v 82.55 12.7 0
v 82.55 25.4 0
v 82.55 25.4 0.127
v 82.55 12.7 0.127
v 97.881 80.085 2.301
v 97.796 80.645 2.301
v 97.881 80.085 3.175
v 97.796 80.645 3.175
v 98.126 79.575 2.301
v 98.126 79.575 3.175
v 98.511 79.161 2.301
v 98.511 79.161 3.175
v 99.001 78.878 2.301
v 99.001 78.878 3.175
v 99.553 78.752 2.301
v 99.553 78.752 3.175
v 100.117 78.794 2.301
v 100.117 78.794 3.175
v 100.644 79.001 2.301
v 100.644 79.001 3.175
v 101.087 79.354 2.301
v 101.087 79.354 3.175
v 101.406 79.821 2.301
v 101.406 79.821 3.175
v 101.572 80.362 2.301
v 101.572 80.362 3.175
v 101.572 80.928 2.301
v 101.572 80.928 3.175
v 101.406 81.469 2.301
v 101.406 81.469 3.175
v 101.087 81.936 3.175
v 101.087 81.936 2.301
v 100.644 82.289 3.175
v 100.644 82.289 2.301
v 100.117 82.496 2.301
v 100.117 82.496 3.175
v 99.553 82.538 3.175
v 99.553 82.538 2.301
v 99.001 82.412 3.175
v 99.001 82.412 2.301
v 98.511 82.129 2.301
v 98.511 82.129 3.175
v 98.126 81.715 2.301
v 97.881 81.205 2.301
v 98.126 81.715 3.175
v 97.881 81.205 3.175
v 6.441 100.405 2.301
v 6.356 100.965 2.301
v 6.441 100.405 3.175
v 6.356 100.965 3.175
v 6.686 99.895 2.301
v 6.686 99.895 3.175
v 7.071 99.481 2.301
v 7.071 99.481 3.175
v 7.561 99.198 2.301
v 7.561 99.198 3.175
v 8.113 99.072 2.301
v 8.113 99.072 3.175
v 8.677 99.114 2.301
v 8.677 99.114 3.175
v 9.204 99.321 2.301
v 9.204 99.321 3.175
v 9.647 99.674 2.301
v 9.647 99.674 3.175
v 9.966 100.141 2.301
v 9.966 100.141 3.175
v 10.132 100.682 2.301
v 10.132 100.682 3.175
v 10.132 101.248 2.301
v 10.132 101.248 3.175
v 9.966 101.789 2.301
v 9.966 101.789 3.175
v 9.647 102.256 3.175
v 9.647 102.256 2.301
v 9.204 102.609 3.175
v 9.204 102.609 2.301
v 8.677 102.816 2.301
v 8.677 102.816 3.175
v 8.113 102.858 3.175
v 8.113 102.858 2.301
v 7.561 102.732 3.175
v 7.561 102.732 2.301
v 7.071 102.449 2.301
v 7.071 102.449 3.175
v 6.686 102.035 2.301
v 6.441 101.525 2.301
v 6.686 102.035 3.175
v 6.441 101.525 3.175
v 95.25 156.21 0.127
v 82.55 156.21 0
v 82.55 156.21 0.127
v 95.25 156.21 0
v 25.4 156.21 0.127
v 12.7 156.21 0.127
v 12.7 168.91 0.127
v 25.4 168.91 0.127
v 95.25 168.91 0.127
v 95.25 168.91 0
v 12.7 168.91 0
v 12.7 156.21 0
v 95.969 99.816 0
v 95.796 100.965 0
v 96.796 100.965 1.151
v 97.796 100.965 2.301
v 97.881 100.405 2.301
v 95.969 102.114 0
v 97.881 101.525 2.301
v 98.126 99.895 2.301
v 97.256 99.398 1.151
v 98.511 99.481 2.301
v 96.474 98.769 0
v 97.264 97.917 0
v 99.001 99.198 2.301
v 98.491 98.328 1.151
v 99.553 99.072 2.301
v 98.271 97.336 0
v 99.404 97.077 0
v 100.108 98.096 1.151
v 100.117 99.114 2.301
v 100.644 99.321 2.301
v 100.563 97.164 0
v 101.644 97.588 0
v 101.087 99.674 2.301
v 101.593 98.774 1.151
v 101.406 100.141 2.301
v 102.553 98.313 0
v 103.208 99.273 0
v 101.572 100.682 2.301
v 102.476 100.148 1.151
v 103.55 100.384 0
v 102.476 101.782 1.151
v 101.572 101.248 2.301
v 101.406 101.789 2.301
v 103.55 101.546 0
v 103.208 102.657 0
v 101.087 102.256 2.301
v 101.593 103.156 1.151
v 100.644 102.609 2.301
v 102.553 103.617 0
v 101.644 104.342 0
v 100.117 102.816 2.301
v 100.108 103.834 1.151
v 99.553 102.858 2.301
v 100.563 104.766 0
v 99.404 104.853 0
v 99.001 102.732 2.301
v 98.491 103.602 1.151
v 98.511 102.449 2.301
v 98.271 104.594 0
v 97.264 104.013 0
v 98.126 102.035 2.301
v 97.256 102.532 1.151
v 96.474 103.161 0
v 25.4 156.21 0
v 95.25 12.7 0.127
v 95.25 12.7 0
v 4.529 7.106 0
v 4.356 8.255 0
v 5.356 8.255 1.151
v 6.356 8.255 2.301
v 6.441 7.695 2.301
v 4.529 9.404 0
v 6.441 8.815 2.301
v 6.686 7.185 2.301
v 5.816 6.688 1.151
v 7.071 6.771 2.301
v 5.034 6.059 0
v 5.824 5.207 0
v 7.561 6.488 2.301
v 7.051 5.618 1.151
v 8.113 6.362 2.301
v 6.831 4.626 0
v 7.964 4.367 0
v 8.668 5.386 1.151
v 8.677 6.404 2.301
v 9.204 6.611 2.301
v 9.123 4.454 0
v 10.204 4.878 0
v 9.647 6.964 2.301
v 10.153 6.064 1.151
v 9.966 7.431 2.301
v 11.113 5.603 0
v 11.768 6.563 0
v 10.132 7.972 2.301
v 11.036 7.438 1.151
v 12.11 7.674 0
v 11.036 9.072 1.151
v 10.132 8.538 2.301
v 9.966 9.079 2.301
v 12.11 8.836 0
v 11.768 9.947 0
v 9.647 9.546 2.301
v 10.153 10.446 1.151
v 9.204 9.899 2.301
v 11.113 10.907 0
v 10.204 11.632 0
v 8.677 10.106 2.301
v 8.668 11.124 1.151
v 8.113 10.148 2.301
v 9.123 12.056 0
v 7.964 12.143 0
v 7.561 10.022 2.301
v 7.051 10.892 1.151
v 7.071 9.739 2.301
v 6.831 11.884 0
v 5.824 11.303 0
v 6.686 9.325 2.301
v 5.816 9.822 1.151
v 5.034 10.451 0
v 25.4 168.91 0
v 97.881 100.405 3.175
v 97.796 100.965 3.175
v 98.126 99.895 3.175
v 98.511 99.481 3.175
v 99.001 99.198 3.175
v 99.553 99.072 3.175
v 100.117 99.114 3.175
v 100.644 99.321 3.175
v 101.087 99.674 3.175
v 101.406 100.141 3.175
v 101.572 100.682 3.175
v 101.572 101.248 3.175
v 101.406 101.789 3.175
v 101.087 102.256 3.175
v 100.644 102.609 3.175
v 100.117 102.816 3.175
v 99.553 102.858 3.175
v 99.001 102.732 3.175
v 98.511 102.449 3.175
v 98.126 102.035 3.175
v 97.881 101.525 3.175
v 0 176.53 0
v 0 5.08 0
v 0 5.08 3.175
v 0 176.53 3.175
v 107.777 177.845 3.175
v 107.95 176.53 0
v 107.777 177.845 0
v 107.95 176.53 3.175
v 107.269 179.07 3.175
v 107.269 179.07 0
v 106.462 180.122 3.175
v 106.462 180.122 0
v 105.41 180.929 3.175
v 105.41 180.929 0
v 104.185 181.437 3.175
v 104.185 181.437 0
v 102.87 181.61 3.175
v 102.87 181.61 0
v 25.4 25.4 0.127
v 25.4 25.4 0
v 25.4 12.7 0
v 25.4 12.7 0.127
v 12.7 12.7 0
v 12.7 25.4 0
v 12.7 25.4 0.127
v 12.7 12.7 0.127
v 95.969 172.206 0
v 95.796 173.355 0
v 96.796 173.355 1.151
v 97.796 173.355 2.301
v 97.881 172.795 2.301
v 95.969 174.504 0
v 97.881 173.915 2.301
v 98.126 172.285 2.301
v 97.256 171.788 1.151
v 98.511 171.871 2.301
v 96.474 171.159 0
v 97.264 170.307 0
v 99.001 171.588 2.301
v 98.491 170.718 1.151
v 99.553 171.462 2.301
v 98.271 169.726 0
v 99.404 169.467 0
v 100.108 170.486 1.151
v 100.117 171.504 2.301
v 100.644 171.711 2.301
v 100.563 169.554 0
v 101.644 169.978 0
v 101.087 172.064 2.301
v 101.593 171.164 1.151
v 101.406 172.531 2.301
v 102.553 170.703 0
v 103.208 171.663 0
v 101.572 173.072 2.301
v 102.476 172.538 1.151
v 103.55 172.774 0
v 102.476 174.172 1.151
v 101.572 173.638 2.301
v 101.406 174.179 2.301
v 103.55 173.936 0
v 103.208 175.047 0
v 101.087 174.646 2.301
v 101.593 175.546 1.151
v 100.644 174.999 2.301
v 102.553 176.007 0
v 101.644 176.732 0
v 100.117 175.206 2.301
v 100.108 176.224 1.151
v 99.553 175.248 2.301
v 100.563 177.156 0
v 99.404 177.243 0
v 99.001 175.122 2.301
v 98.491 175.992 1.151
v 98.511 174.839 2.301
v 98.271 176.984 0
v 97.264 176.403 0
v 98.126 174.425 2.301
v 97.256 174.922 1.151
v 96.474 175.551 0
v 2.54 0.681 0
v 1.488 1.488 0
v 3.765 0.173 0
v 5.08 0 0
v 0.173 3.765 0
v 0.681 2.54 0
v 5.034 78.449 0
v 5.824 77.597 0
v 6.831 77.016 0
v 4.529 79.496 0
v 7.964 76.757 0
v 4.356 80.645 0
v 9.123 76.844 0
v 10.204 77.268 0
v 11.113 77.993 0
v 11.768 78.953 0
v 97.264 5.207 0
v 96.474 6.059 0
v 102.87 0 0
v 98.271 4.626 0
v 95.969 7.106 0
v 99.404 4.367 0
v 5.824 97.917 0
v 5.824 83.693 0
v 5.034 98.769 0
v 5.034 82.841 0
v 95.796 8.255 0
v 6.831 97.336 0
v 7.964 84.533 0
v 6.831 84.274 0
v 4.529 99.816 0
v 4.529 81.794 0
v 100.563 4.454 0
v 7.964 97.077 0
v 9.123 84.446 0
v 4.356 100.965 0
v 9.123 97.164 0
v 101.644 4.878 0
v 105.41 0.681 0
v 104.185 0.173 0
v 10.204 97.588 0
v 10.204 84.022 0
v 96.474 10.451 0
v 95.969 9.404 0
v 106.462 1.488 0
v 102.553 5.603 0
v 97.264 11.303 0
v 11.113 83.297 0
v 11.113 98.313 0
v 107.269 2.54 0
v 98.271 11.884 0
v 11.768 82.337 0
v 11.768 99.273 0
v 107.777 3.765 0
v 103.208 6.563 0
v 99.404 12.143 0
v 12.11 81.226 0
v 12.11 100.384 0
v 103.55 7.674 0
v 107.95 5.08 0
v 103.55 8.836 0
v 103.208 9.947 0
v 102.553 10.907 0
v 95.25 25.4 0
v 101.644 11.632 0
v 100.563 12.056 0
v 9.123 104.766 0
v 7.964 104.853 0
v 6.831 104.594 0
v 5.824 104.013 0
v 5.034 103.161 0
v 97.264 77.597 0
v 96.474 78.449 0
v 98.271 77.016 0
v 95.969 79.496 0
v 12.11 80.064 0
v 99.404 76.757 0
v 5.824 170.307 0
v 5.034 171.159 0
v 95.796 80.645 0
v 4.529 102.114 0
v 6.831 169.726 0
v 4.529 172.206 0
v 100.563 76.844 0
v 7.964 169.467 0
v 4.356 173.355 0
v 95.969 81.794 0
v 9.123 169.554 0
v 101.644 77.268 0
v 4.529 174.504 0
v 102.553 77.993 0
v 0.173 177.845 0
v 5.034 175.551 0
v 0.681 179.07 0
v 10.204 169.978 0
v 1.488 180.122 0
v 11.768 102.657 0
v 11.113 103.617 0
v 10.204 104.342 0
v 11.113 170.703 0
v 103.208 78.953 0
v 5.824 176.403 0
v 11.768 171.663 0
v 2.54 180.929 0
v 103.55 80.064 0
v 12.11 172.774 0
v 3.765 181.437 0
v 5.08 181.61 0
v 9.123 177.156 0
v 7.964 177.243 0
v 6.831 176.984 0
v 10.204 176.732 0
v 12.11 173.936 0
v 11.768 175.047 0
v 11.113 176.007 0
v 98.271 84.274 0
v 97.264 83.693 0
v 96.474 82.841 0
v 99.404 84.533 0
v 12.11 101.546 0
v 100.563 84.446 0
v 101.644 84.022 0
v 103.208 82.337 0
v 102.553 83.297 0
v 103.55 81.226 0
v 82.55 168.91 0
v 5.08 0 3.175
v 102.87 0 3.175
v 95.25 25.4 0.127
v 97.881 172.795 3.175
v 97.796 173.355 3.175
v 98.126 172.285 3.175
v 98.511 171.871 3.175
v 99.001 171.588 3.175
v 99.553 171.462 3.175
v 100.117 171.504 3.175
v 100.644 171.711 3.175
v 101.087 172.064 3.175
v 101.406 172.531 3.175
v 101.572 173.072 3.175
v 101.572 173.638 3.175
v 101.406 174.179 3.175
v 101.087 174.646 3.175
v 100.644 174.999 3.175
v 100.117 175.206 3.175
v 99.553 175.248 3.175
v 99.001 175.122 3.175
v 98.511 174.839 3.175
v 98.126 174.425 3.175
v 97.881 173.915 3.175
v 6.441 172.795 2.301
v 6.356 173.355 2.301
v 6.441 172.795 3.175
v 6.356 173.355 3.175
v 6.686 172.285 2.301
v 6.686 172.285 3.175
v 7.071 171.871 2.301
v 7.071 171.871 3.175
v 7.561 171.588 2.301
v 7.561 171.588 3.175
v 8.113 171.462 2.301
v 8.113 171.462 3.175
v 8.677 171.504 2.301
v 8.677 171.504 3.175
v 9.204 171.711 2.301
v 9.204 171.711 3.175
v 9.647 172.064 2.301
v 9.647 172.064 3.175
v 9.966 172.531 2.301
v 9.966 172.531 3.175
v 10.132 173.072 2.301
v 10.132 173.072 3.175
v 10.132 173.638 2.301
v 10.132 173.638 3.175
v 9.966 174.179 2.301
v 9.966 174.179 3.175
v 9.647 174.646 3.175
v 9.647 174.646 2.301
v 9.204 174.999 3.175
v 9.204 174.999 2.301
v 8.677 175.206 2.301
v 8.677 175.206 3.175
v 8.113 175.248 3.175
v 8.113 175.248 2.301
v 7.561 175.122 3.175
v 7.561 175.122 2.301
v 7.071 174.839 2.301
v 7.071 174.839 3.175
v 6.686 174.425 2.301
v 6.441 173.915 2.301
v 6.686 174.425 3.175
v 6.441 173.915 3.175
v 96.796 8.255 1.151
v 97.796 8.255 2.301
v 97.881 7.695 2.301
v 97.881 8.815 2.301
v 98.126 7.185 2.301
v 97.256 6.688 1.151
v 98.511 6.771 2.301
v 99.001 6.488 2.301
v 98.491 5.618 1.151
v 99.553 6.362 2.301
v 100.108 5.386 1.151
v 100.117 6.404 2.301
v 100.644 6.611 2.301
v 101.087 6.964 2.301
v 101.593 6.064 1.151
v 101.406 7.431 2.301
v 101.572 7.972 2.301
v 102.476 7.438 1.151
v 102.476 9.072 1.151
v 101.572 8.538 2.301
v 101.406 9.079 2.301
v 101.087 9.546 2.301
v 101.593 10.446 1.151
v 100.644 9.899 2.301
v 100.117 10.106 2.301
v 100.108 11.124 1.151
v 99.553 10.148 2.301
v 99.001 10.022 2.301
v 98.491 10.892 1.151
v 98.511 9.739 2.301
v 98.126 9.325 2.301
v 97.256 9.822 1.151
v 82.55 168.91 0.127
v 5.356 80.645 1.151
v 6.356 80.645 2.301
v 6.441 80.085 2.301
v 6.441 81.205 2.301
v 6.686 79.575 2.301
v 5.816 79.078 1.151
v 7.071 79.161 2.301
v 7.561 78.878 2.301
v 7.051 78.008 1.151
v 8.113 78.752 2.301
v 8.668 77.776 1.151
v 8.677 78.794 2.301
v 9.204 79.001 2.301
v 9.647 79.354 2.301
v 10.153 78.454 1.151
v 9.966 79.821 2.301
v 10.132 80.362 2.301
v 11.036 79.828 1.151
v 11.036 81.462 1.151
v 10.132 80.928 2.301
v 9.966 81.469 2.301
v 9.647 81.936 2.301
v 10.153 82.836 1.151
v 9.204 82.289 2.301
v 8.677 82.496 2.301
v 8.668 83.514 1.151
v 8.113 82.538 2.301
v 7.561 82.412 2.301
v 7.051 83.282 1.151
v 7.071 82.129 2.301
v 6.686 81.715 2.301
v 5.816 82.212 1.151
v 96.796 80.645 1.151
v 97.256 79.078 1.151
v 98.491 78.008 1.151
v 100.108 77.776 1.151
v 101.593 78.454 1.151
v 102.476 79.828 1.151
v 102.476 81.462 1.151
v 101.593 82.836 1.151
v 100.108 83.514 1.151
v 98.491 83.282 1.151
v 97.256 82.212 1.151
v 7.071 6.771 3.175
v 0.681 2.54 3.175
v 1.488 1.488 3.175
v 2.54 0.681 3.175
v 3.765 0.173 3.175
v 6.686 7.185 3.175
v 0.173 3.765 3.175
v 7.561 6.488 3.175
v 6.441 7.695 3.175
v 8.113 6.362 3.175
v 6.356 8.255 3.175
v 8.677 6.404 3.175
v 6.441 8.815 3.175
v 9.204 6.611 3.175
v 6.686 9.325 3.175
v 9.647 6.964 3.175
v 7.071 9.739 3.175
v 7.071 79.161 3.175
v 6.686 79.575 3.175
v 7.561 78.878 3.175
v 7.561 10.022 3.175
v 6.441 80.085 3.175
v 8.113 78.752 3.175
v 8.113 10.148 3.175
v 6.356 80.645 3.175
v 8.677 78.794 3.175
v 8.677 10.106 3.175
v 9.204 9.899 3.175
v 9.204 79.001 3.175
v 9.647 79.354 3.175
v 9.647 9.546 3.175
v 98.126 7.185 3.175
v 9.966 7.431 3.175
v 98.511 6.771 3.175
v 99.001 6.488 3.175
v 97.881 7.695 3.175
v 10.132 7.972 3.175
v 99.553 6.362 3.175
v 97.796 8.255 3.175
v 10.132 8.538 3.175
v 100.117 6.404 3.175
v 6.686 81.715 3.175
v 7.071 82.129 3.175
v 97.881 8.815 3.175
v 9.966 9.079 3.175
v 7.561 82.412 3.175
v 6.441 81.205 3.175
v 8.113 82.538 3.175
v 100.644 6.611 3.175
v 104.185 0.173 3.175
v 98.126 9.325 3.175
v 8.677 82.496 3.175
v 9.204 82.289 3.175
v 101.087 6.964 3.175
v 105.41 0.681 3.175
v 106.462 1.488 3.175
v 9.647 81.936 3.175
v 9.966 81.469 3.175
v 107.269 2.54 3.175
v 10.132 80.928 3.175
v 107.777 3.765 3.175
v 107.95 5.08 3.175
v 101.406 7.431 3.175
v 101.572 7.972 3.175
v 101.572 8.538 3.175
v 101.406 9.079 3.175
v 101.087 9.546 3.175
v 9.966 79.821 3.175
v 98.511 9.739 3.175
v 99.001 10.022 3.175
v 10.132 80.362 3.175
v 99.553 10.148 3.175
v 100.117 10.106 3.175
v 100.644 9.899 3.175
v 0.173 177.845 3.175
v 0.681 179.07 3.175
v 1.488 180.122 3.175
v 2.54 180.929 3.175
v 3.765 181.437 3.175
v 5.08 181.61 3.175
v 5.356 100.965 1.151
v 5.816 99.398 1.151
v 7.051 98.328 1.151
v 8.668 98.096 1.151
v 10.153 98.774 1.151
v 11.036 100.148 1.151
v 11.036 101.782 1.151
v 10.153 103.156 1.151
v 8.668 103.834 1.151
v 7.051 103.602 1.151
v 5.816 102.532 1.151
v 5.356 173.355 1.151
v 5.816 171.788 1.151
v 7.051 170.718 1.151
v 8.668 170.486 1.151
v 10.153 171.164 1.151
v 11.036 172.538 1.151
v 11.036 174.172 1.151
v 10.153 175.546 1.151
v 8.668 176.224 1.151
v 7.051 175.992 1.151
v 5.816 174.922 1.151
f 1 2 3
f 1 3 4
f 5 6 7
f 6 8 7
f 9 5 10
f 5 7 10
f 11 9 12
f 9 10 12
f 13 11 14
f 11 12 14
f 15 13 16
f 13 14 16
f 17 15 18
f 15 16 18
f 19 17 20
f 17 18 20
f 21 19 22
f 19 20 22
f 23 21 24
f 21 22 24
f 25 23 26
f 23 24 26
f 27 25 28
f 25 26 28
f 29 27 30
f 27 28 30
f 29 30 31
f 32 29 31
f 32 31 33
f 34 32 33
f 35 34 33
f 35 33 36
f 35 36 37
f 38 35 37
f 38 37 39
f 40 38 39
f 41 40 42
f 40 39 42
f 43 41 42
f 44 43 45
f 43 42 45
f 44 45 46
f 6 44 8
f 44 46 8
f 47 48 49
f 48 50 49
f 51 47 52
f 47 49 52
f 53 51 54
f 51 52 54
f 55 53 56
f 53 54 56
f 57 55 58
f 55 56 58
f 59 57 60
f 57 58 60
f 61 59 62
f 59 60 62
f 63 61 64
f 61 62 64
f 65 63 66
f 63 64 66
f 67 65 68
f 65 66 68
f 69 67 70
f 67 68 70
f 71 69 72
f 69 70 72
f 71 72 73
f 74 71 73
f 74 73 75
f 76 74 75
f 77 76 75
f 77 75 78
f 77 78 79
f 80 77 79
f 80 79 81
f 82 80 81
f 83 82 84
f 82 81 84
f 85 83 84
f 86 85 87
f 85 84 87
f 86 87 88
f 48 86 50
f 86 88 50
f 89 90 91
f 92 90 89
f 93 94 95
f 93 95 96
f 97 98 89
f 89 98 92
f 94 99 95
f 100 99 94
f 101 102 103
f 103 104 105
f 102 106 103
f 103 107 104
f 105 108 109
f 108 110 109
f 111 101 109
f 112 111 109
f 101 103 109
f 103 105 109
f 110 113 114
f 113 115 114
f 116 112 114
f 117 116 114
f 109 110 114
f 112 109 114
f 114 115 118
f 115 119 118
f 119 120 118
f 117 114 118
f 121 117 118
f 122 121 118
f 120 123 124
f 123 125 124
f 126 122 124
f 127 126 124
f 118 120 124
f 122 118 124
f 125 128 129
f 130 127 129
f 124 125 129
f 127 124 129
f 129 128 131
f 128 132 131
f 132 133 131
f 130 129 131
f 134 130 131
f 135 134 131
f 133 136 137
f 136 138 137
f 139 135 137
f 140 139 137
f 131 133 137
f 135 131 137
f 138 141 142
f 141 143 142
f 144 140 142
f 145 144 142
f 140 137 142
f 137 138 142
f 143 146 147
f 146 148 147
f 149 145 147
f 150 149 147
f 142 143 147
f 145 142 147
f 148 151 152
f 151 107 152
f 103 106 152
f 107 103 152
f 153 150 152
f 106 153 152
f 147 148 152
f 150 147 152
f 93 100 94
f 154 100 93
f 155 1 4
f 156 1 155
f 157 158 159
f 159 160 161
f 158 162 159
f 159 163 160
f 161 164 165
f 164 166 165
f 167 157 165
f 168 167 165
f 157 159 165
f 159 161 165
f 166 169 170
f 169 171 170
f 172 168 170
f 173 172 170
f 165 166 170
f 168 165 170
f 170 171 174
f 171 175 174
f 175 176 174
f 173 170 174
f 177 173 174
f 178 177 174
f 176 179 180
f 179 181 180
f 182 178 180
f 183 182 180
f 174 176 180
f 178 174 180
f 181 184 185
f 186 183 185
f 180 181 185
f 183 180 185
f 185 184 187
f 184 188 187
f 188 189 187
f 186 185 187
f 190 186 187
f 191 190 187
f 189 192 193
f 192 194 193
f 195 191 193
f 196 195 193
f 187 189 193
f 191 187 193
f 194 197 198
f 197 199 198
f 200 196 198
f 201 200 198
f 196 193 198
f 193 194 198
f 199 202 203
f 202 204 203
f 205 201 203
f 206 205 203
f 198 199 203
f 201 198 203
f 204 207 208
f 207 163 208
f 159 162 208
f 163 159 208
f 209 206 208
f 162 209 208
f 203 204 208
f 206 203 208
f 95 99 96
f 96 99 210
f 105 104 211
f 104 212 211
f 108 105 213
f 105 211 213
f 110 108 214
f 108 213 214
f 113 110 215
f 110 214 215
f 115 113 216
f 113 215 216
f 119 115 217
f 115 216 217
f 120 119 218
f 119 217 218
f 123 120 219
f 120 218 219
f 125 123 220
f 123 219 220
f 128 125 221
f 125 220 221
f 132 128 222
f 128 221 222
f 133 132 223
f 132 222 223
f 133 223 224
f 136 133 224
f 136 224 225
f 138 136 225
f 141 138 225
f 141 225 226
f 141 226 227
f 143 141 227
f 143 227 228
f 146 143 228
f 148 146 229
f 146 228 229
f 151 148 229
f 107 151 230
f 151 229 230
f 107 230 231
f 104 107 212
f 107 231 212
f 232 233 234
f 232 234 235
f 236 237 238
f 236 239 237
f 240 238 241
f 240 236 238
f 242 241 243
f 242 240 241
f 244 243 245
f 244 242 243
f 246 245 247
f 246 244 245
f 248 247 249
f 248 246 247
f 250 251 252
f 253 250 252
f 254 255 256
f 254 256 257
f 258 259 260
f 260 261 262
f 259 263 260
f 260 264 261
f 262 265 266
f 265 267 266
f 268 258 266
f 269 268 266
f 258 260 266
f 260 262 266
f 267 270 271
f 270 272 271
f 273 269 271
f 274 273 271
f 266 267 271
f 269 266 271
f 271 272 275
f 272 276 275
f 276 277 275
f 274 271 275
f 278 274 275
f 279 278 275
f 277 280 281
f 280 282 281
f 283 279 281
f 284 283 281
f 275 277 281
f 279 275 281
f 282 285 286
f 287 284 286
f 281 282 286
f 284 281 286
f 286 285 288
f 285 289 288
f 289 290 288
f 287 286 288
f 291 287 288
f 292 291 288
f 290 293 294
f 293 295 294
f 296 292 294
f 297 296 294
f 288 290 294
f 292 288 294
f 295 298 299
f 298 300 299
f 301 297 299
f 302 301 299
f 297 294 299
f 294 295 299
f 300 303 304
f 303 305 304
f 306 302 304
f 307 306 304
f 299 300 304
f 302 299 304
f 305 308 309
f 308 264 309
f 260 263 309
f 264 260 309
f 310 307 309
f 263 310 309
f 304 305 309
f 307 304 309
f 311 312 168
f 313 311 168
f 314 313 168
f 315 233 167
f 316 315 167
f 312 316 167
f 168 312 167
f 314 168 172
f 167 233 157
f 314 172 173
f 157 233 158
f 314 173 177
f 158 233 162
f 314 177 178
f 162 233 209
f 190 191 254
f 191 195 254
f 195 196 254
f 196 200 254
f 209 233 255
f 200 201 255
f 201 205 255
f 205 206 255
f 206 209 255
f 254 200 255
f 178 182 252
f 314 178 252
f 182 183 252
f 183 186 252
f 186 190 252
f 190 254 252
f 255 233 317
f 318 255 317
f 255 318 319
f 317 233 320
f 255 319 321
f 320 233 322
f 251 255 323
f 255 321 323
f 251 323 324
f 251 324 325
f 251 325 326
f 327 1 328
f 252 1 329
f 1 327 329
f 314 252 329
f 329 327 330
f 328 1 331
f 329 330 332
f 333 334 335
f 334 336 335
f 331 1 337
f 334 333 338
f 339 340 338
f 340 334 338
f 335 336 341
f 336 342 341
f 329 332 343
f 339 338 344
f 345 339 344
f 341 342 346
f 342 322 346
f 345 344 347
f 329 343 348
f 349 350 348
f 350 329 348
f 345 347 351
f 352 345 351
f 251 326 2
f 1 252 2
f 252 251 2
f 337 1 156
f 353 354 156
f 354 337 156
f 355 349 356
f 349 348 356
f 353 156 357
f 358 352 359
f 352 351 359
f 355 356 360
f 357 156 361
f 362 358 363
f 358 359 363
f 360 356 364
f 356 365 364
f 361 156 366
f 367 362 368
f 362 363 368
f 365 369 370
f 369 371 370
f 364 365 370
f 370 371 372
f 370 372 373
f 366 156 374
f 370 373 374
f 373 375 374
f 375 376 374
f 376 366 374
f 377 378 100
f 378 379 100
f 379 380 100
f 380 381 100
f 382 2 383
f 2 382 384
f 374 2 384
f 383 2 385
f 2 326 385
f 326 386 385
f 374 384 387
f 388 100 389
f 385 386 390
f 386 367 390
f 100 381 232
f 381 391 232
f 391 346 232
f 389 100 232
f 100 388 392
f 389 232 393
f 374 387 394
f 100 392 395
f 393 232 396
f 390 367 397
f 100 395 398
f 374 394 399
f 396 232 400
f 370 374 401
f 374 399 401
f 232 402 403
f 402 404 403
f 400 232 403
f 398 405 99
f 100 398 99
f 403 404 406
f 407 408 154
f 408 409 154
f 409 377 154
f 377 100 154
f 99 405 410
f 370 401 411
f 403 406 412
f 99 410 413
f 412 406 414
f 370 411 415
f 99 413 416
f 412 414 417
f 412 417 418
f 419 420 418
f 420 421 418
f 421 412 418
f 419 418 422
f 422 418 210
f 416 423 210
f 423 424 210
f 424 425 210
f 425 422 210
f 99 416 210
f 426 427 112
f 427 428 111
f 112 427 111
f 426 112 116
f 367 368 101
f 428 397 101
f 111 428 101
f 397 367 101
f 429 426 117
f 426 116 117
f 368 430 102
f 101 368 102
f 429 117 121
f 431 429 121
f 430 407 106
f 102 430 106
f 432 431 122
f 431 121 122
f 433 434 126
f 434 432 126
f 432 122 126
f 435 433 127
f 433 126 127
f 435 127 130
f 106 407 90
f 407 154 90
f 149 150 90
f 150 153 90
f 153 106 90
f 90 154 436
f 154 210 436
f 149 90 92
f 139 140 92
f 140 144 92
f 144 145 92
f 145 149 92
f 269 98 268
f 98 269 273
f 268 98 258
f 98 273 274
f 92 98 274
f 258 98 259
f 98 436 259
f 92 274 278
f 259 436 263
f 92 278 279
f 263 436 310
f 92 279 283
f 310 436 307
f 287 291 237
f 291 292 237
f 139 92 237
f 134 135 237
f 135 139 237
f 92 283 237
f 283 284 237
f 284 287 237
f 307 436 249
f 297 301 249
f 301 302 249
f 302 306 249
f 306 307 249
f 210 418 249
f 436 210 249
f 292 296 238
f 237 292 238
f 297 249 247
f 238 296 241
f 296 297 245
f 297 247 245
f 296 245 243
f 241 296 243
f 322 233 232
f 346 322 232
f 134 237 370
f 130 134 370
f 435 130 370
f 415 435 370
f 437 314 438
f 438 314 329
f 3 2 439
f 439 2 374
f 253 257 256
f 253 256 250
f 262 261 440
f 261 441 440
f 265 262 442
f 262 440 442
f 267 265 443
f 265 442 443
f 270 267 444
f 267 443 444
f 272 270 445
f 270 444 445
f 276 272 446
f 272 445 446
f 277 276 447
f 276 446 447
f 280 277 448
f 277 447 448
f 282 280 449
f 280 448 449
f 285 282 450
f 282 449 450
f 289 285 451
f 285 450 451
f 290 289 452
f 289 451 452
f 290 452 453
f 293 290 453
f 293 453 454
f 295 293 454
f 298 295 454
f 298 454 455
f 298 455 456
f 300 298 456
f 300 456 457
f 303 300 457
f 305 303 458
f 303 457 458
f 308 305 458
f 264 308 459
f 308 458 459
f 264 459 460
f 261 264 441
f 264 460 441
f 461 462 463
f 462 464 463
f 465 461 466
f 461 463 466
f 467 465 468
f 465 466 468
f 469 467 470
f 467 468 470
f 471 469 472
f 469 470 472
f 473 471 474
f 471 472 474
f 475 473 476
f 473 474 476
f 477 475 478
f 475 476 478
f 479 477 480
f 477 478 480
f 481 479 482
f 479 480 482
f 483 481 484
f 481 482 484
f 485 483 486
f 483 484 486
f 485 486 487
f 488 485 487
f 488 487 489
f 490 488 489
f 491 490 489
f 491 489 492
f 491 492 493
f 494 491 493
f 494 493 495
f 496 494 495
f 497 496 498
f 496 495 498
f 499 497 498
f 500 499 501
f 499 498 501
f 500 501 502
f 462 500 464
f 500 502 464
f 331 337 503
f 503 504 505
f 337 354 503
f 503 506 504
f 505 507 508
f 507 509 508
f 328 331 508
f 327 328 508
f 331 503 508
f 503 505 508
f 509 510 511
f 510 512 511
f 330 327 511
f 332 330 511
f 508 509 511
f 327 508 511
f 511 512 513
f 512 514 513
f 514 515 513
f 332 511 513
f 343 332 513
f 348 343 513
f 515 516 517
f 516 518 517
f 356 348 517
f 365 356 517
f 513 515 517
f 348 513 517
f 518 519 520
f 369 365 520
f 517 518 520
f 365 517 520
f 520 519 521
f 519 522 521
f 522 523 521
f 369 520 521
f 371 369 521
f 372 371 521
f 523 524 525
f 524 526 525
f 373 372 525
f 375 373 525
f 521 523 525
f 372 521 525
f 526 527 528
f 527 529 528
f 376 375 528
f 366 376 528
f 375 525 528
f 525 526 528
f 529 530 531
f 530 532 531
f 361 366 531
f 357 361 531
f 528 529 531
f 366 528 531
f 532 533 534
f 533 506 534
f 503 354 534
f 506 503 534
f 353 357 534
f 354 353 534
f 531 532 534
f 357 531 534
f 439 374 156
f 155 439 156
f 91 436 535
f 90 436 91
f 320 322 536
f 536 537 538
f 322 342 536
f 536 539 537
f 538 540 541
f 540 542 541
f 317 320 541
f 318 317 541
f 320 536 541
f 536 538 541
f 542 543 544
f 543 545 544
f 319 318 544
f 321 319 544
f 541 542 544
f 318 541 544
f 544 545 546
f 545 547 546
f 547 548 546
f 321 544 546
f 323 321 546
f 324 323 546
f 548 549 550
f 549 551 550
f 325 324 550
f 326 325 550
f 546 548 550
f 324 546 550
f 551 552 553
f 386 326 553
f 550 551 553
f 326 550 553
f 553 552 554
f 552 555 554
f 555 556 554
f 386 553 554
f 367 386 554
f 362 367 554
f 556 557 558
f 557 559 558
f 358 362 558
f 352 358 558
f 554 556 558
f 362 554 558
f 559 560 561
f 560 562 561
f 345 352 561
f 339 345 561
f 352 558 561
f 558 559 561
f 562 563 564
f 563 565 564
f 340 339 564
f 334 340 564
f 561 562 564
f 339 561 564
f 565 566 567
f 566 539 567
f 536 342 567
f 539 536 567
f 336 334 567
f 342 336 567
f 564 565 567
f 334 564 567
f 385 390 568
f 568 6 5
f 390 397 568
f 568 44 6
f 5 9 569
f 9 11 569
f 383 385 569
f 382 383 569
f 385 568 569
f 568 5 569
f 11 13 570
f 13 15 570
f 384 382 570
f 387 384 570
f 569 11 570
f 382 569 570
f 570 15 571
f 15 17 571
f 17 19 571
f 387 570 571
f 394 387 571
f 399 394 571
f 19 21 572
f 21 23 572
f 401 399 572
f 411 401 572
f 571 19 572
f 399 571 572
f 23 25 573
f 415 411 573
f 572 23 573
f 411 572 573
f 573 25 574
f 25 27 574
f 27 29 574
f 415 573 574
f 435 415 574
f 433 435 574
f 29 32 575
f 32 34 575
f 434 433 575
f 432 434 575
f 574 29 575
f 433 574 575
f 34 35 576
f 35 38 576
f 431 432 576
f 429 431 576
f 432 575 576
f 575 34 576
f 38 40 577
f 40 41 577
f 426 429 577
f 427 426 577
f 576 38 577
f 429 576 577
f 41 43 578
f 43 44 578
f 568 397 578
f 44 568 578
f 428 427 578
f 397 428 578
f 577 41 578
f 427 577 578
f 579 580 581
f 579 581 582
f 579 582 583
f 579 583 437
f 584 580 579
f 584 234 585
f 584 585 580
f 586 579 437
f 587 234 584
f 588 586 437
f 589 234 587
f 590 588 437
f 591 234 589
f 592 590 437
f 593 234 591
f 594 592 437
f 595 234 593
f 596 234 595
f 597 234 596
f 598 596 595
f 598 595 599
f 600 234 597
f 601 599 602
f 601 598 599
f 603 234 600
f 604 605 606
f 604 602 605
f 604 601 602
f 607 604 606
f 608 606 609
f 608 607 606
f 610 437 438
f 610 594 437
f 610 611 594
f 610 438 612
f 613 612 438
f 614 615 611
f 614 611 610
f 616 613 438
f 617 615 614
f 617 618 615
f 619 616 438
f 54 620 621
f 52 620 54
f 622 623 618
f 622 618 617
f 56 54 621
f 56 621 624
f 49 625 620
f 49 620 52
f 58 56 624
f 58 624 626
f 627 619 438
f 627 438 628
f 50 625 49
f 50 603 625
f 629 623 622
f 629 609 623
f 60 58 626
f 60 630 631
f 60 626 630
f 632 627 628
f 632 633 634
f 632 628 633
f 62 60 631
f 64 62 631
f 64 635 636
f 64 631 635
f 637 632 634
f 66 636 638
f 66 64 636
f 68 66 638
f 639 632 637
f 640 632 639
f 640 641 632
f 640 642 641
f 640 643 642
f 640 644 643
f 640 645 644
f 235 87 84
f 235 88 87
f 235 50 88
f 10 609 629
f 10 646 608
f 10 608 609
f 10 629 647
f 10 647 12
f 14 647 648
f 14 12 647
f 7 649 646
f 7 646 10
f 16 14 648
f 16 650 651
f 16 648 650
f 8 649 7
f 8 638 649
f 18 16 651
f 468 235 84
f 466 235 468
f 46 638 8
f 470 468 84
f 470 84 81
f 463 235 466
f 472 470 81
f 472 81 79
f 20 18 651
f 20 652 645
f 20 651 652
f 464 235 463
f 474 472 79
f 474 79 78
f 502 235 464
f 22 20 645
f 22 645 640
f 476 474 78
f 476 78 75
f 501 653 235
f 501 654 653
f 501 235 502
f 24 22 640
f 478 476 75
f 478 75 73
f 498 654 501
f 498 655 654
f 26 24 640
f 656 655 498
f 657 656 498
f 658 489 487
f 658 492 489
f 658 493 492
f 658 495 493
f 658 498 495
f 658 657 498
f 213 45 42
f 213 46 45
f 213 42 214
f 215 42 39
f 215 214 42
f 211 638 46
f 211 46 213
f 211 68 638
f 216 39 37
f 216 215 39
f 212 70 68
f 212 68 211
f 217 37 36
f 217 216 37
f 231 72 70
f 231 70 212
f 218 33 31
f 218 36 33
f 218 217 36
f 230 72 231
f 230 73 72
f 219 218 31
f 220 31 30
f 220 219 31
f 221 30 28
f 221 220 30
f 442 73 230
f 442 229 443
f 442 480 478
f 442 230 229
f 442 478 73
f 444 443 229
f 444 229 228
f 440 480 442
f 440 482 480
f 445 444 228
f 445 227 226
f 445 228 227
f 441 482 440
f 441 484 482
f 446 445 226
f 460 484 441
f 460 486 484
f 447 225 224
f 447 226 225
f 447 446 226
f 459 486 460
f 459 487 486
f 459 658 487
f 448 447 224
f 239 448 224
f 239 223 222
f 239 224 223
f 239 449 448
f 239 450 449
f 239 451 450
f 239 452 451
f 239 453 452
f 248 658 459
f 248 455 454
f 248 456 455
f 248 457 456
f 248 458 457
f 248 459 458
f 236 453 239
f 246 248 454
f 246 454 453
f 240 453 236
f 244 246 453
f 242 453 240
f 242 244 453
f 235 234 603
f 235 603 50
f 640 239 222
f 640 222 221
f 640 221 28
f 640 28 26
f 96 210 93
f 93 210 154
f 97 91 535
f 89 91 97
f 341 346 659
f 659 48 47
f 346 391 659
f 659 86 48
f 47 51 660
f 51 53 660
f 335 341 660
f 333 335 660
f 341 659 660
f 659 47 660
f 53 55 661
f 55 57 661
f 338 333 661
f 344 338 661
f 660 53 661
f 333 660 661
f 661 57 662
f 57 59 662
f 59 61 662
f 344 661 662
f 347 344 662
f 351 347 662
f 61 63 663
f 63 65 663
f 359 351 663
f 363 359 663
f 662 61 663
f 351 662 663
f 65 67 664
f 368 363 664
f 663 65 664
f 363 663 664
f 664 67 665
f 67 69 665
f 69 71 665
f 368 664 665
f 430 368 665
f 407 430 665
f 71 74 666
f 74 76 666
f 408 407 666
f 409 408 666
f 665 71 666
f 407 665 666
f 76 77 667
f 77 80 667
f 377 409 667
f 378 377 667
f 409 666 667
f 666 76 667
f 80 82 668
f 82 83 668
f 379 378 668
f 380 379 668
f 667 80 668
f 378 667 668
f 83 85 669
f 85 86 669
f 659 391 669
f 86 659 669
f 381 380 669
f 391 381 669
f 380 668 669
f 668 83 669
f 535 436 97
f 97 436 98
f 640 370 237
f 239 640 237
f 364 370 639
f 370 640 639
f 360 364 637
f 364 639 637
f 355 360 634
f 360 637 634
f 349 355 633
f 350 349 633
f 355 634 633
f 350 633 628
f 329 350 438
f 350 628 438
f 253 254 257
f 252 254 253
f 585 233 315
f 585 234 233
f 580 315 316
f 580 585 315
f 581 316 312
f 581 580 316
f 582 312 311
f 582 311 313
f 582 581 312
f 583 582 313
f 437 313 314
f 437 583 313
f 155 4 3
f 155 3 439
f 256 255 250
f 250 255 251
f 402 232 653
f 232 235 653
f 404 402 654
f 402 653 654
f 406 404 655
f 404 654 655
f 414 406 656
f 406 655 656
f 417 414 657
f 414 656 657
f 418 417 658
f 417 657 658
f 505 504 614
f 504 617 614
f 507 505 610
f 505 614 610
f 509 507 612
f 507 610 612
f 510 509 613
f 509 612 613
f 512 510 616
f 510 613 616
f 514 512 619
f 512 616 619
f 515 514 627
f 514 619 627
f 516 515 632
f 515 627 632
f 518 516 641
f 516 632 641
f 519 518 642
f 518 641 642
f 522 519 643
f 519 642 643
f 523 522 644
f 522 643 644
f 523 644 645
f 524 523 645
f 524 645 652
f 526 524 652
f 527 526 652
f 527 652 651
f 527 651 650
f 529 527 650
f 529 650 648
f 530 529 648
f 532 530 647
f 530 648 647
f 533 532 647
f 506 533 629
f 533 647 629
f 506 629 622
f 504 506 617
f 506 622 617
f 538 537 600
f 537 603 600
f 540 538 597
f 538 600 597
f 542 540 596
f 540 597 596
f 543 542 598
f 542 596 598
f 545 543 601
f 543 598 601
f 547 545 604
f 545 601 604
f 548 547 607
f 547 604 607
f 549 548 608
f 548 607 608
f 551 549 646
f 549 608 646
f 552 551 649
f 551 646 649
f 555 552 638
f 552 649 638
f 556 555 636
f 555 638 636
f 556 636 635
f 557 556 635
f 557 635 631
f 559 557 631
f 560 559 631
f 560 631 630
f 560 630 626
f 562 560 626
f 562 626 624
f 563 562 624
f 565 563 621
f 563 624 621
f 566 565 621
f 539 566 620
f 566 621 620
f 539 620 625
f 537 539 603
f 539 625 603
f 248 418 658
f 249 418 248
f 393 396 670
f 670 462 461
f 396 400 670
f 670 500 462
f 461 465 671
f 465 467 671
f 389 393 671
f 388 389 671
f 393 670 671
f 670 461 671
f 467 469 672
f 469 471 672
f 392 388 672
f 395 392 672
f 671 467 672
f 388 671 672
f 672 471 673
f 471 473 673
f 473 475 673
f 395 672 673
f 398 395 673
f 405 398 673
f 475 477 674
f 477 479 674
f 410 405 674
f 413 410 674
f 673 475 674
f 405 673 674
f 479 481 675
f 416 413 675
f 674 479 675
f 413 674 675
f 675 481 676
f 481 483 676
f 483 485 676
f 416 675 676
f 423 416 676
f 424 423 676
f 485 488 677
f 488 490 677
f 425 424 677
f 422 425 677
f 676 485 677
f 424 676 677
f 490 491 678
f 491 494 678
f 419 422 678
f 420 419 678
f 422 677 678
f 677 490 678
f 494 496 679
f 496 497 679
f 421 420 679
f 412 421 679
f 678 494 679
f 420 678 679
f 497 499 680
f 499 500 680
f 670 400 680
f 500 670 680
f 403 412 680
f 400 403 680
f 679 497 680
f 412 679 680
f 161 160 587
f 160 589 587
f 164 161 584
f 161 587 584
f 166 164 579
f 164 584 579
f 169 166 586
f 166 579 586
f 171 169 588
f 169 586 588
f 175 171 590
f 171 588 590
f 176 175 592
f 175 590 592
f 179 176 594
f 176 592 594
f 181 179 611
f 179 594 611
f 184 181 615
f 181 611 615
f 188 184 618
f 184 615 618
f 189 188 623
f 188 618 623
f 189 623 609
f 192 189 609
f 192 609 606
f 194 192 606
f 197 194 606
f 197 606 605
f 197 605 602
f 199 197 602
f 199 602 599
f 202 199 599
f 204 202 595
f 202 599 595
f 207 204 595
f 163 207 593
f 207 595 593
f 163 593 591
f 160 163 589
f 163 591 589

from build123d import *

# Parameters (mm, degrees)
F0_W           = 107.95
F0_H           = 181.61
F1_DEPTH       = 3.175
F3_D           = 3.7973
F3_CSINK_D     = 7.7978
F3_CSINK_ANGLE = 82
F4_R           = 5.08
F5_W           = 12.7
F5_H           = 12.7
F6_DEPTH       = 0.127


with BuildPart() as f1:
    # F0 (on Top) → F1 (new body)
    with BuildSketch(Plane.XY):
        with Locations((53.975, 90.805)):
            Rectangle(F0_W, F0_H)
    extrude(amount=F1_DEPTH)

    # F3 (through all)
    with Locations(Plane(origin=(0, 0, 0), x_dir=(1, 0, 0), z_dir=(0, 0, -1))):
        with Locations((8.255, -8.255), (99.695, -8.255), (99.695, -80.645), (8.255, -80.645), (8.255, -100.965), (8.255, -173.355), (99.695, -173.355), (99.695, -100.965)):
            CounterSinkHole(F3_D / 2, F3_CSINK_D / 2, counter_sink_angle=F3_CSINK_ANGLE)

    # F4
    f4_edges = [f1.edges().sort_by_distance(p)[0] for p in [
        (0, 0, 1.5875),
        (107.95, 0, 1.5875),
        (107.95, 181.61, 1.5875),
        (0, 181.61, 1.5875),
    ]]
    fillet(f4_edges, radius=F4_R)

    # F5 (on face) → F6 (cut)
    with BuildSketch(Plane(origin=(0, 0, 0), x_dir=(1, 0, 0), z_dir=(0, 0, -1))):
        with Locations((19.05, -19.05)):
            Rectangle(F5_W, F5_H)
        with Locations((88.9, -19.05)):
            Rectangle(F5_W, F5_H)
        with Locations((19.05, -162.56)):
            Rectangle(F5_W, F5_H)
        with Locations((88.9, -162.56)):
            Rectangle(F5_W, F5_H)
    extrude(amount=-F6_DEPTH, mode=Mode.SUBTRACT)


solid = f1.part
